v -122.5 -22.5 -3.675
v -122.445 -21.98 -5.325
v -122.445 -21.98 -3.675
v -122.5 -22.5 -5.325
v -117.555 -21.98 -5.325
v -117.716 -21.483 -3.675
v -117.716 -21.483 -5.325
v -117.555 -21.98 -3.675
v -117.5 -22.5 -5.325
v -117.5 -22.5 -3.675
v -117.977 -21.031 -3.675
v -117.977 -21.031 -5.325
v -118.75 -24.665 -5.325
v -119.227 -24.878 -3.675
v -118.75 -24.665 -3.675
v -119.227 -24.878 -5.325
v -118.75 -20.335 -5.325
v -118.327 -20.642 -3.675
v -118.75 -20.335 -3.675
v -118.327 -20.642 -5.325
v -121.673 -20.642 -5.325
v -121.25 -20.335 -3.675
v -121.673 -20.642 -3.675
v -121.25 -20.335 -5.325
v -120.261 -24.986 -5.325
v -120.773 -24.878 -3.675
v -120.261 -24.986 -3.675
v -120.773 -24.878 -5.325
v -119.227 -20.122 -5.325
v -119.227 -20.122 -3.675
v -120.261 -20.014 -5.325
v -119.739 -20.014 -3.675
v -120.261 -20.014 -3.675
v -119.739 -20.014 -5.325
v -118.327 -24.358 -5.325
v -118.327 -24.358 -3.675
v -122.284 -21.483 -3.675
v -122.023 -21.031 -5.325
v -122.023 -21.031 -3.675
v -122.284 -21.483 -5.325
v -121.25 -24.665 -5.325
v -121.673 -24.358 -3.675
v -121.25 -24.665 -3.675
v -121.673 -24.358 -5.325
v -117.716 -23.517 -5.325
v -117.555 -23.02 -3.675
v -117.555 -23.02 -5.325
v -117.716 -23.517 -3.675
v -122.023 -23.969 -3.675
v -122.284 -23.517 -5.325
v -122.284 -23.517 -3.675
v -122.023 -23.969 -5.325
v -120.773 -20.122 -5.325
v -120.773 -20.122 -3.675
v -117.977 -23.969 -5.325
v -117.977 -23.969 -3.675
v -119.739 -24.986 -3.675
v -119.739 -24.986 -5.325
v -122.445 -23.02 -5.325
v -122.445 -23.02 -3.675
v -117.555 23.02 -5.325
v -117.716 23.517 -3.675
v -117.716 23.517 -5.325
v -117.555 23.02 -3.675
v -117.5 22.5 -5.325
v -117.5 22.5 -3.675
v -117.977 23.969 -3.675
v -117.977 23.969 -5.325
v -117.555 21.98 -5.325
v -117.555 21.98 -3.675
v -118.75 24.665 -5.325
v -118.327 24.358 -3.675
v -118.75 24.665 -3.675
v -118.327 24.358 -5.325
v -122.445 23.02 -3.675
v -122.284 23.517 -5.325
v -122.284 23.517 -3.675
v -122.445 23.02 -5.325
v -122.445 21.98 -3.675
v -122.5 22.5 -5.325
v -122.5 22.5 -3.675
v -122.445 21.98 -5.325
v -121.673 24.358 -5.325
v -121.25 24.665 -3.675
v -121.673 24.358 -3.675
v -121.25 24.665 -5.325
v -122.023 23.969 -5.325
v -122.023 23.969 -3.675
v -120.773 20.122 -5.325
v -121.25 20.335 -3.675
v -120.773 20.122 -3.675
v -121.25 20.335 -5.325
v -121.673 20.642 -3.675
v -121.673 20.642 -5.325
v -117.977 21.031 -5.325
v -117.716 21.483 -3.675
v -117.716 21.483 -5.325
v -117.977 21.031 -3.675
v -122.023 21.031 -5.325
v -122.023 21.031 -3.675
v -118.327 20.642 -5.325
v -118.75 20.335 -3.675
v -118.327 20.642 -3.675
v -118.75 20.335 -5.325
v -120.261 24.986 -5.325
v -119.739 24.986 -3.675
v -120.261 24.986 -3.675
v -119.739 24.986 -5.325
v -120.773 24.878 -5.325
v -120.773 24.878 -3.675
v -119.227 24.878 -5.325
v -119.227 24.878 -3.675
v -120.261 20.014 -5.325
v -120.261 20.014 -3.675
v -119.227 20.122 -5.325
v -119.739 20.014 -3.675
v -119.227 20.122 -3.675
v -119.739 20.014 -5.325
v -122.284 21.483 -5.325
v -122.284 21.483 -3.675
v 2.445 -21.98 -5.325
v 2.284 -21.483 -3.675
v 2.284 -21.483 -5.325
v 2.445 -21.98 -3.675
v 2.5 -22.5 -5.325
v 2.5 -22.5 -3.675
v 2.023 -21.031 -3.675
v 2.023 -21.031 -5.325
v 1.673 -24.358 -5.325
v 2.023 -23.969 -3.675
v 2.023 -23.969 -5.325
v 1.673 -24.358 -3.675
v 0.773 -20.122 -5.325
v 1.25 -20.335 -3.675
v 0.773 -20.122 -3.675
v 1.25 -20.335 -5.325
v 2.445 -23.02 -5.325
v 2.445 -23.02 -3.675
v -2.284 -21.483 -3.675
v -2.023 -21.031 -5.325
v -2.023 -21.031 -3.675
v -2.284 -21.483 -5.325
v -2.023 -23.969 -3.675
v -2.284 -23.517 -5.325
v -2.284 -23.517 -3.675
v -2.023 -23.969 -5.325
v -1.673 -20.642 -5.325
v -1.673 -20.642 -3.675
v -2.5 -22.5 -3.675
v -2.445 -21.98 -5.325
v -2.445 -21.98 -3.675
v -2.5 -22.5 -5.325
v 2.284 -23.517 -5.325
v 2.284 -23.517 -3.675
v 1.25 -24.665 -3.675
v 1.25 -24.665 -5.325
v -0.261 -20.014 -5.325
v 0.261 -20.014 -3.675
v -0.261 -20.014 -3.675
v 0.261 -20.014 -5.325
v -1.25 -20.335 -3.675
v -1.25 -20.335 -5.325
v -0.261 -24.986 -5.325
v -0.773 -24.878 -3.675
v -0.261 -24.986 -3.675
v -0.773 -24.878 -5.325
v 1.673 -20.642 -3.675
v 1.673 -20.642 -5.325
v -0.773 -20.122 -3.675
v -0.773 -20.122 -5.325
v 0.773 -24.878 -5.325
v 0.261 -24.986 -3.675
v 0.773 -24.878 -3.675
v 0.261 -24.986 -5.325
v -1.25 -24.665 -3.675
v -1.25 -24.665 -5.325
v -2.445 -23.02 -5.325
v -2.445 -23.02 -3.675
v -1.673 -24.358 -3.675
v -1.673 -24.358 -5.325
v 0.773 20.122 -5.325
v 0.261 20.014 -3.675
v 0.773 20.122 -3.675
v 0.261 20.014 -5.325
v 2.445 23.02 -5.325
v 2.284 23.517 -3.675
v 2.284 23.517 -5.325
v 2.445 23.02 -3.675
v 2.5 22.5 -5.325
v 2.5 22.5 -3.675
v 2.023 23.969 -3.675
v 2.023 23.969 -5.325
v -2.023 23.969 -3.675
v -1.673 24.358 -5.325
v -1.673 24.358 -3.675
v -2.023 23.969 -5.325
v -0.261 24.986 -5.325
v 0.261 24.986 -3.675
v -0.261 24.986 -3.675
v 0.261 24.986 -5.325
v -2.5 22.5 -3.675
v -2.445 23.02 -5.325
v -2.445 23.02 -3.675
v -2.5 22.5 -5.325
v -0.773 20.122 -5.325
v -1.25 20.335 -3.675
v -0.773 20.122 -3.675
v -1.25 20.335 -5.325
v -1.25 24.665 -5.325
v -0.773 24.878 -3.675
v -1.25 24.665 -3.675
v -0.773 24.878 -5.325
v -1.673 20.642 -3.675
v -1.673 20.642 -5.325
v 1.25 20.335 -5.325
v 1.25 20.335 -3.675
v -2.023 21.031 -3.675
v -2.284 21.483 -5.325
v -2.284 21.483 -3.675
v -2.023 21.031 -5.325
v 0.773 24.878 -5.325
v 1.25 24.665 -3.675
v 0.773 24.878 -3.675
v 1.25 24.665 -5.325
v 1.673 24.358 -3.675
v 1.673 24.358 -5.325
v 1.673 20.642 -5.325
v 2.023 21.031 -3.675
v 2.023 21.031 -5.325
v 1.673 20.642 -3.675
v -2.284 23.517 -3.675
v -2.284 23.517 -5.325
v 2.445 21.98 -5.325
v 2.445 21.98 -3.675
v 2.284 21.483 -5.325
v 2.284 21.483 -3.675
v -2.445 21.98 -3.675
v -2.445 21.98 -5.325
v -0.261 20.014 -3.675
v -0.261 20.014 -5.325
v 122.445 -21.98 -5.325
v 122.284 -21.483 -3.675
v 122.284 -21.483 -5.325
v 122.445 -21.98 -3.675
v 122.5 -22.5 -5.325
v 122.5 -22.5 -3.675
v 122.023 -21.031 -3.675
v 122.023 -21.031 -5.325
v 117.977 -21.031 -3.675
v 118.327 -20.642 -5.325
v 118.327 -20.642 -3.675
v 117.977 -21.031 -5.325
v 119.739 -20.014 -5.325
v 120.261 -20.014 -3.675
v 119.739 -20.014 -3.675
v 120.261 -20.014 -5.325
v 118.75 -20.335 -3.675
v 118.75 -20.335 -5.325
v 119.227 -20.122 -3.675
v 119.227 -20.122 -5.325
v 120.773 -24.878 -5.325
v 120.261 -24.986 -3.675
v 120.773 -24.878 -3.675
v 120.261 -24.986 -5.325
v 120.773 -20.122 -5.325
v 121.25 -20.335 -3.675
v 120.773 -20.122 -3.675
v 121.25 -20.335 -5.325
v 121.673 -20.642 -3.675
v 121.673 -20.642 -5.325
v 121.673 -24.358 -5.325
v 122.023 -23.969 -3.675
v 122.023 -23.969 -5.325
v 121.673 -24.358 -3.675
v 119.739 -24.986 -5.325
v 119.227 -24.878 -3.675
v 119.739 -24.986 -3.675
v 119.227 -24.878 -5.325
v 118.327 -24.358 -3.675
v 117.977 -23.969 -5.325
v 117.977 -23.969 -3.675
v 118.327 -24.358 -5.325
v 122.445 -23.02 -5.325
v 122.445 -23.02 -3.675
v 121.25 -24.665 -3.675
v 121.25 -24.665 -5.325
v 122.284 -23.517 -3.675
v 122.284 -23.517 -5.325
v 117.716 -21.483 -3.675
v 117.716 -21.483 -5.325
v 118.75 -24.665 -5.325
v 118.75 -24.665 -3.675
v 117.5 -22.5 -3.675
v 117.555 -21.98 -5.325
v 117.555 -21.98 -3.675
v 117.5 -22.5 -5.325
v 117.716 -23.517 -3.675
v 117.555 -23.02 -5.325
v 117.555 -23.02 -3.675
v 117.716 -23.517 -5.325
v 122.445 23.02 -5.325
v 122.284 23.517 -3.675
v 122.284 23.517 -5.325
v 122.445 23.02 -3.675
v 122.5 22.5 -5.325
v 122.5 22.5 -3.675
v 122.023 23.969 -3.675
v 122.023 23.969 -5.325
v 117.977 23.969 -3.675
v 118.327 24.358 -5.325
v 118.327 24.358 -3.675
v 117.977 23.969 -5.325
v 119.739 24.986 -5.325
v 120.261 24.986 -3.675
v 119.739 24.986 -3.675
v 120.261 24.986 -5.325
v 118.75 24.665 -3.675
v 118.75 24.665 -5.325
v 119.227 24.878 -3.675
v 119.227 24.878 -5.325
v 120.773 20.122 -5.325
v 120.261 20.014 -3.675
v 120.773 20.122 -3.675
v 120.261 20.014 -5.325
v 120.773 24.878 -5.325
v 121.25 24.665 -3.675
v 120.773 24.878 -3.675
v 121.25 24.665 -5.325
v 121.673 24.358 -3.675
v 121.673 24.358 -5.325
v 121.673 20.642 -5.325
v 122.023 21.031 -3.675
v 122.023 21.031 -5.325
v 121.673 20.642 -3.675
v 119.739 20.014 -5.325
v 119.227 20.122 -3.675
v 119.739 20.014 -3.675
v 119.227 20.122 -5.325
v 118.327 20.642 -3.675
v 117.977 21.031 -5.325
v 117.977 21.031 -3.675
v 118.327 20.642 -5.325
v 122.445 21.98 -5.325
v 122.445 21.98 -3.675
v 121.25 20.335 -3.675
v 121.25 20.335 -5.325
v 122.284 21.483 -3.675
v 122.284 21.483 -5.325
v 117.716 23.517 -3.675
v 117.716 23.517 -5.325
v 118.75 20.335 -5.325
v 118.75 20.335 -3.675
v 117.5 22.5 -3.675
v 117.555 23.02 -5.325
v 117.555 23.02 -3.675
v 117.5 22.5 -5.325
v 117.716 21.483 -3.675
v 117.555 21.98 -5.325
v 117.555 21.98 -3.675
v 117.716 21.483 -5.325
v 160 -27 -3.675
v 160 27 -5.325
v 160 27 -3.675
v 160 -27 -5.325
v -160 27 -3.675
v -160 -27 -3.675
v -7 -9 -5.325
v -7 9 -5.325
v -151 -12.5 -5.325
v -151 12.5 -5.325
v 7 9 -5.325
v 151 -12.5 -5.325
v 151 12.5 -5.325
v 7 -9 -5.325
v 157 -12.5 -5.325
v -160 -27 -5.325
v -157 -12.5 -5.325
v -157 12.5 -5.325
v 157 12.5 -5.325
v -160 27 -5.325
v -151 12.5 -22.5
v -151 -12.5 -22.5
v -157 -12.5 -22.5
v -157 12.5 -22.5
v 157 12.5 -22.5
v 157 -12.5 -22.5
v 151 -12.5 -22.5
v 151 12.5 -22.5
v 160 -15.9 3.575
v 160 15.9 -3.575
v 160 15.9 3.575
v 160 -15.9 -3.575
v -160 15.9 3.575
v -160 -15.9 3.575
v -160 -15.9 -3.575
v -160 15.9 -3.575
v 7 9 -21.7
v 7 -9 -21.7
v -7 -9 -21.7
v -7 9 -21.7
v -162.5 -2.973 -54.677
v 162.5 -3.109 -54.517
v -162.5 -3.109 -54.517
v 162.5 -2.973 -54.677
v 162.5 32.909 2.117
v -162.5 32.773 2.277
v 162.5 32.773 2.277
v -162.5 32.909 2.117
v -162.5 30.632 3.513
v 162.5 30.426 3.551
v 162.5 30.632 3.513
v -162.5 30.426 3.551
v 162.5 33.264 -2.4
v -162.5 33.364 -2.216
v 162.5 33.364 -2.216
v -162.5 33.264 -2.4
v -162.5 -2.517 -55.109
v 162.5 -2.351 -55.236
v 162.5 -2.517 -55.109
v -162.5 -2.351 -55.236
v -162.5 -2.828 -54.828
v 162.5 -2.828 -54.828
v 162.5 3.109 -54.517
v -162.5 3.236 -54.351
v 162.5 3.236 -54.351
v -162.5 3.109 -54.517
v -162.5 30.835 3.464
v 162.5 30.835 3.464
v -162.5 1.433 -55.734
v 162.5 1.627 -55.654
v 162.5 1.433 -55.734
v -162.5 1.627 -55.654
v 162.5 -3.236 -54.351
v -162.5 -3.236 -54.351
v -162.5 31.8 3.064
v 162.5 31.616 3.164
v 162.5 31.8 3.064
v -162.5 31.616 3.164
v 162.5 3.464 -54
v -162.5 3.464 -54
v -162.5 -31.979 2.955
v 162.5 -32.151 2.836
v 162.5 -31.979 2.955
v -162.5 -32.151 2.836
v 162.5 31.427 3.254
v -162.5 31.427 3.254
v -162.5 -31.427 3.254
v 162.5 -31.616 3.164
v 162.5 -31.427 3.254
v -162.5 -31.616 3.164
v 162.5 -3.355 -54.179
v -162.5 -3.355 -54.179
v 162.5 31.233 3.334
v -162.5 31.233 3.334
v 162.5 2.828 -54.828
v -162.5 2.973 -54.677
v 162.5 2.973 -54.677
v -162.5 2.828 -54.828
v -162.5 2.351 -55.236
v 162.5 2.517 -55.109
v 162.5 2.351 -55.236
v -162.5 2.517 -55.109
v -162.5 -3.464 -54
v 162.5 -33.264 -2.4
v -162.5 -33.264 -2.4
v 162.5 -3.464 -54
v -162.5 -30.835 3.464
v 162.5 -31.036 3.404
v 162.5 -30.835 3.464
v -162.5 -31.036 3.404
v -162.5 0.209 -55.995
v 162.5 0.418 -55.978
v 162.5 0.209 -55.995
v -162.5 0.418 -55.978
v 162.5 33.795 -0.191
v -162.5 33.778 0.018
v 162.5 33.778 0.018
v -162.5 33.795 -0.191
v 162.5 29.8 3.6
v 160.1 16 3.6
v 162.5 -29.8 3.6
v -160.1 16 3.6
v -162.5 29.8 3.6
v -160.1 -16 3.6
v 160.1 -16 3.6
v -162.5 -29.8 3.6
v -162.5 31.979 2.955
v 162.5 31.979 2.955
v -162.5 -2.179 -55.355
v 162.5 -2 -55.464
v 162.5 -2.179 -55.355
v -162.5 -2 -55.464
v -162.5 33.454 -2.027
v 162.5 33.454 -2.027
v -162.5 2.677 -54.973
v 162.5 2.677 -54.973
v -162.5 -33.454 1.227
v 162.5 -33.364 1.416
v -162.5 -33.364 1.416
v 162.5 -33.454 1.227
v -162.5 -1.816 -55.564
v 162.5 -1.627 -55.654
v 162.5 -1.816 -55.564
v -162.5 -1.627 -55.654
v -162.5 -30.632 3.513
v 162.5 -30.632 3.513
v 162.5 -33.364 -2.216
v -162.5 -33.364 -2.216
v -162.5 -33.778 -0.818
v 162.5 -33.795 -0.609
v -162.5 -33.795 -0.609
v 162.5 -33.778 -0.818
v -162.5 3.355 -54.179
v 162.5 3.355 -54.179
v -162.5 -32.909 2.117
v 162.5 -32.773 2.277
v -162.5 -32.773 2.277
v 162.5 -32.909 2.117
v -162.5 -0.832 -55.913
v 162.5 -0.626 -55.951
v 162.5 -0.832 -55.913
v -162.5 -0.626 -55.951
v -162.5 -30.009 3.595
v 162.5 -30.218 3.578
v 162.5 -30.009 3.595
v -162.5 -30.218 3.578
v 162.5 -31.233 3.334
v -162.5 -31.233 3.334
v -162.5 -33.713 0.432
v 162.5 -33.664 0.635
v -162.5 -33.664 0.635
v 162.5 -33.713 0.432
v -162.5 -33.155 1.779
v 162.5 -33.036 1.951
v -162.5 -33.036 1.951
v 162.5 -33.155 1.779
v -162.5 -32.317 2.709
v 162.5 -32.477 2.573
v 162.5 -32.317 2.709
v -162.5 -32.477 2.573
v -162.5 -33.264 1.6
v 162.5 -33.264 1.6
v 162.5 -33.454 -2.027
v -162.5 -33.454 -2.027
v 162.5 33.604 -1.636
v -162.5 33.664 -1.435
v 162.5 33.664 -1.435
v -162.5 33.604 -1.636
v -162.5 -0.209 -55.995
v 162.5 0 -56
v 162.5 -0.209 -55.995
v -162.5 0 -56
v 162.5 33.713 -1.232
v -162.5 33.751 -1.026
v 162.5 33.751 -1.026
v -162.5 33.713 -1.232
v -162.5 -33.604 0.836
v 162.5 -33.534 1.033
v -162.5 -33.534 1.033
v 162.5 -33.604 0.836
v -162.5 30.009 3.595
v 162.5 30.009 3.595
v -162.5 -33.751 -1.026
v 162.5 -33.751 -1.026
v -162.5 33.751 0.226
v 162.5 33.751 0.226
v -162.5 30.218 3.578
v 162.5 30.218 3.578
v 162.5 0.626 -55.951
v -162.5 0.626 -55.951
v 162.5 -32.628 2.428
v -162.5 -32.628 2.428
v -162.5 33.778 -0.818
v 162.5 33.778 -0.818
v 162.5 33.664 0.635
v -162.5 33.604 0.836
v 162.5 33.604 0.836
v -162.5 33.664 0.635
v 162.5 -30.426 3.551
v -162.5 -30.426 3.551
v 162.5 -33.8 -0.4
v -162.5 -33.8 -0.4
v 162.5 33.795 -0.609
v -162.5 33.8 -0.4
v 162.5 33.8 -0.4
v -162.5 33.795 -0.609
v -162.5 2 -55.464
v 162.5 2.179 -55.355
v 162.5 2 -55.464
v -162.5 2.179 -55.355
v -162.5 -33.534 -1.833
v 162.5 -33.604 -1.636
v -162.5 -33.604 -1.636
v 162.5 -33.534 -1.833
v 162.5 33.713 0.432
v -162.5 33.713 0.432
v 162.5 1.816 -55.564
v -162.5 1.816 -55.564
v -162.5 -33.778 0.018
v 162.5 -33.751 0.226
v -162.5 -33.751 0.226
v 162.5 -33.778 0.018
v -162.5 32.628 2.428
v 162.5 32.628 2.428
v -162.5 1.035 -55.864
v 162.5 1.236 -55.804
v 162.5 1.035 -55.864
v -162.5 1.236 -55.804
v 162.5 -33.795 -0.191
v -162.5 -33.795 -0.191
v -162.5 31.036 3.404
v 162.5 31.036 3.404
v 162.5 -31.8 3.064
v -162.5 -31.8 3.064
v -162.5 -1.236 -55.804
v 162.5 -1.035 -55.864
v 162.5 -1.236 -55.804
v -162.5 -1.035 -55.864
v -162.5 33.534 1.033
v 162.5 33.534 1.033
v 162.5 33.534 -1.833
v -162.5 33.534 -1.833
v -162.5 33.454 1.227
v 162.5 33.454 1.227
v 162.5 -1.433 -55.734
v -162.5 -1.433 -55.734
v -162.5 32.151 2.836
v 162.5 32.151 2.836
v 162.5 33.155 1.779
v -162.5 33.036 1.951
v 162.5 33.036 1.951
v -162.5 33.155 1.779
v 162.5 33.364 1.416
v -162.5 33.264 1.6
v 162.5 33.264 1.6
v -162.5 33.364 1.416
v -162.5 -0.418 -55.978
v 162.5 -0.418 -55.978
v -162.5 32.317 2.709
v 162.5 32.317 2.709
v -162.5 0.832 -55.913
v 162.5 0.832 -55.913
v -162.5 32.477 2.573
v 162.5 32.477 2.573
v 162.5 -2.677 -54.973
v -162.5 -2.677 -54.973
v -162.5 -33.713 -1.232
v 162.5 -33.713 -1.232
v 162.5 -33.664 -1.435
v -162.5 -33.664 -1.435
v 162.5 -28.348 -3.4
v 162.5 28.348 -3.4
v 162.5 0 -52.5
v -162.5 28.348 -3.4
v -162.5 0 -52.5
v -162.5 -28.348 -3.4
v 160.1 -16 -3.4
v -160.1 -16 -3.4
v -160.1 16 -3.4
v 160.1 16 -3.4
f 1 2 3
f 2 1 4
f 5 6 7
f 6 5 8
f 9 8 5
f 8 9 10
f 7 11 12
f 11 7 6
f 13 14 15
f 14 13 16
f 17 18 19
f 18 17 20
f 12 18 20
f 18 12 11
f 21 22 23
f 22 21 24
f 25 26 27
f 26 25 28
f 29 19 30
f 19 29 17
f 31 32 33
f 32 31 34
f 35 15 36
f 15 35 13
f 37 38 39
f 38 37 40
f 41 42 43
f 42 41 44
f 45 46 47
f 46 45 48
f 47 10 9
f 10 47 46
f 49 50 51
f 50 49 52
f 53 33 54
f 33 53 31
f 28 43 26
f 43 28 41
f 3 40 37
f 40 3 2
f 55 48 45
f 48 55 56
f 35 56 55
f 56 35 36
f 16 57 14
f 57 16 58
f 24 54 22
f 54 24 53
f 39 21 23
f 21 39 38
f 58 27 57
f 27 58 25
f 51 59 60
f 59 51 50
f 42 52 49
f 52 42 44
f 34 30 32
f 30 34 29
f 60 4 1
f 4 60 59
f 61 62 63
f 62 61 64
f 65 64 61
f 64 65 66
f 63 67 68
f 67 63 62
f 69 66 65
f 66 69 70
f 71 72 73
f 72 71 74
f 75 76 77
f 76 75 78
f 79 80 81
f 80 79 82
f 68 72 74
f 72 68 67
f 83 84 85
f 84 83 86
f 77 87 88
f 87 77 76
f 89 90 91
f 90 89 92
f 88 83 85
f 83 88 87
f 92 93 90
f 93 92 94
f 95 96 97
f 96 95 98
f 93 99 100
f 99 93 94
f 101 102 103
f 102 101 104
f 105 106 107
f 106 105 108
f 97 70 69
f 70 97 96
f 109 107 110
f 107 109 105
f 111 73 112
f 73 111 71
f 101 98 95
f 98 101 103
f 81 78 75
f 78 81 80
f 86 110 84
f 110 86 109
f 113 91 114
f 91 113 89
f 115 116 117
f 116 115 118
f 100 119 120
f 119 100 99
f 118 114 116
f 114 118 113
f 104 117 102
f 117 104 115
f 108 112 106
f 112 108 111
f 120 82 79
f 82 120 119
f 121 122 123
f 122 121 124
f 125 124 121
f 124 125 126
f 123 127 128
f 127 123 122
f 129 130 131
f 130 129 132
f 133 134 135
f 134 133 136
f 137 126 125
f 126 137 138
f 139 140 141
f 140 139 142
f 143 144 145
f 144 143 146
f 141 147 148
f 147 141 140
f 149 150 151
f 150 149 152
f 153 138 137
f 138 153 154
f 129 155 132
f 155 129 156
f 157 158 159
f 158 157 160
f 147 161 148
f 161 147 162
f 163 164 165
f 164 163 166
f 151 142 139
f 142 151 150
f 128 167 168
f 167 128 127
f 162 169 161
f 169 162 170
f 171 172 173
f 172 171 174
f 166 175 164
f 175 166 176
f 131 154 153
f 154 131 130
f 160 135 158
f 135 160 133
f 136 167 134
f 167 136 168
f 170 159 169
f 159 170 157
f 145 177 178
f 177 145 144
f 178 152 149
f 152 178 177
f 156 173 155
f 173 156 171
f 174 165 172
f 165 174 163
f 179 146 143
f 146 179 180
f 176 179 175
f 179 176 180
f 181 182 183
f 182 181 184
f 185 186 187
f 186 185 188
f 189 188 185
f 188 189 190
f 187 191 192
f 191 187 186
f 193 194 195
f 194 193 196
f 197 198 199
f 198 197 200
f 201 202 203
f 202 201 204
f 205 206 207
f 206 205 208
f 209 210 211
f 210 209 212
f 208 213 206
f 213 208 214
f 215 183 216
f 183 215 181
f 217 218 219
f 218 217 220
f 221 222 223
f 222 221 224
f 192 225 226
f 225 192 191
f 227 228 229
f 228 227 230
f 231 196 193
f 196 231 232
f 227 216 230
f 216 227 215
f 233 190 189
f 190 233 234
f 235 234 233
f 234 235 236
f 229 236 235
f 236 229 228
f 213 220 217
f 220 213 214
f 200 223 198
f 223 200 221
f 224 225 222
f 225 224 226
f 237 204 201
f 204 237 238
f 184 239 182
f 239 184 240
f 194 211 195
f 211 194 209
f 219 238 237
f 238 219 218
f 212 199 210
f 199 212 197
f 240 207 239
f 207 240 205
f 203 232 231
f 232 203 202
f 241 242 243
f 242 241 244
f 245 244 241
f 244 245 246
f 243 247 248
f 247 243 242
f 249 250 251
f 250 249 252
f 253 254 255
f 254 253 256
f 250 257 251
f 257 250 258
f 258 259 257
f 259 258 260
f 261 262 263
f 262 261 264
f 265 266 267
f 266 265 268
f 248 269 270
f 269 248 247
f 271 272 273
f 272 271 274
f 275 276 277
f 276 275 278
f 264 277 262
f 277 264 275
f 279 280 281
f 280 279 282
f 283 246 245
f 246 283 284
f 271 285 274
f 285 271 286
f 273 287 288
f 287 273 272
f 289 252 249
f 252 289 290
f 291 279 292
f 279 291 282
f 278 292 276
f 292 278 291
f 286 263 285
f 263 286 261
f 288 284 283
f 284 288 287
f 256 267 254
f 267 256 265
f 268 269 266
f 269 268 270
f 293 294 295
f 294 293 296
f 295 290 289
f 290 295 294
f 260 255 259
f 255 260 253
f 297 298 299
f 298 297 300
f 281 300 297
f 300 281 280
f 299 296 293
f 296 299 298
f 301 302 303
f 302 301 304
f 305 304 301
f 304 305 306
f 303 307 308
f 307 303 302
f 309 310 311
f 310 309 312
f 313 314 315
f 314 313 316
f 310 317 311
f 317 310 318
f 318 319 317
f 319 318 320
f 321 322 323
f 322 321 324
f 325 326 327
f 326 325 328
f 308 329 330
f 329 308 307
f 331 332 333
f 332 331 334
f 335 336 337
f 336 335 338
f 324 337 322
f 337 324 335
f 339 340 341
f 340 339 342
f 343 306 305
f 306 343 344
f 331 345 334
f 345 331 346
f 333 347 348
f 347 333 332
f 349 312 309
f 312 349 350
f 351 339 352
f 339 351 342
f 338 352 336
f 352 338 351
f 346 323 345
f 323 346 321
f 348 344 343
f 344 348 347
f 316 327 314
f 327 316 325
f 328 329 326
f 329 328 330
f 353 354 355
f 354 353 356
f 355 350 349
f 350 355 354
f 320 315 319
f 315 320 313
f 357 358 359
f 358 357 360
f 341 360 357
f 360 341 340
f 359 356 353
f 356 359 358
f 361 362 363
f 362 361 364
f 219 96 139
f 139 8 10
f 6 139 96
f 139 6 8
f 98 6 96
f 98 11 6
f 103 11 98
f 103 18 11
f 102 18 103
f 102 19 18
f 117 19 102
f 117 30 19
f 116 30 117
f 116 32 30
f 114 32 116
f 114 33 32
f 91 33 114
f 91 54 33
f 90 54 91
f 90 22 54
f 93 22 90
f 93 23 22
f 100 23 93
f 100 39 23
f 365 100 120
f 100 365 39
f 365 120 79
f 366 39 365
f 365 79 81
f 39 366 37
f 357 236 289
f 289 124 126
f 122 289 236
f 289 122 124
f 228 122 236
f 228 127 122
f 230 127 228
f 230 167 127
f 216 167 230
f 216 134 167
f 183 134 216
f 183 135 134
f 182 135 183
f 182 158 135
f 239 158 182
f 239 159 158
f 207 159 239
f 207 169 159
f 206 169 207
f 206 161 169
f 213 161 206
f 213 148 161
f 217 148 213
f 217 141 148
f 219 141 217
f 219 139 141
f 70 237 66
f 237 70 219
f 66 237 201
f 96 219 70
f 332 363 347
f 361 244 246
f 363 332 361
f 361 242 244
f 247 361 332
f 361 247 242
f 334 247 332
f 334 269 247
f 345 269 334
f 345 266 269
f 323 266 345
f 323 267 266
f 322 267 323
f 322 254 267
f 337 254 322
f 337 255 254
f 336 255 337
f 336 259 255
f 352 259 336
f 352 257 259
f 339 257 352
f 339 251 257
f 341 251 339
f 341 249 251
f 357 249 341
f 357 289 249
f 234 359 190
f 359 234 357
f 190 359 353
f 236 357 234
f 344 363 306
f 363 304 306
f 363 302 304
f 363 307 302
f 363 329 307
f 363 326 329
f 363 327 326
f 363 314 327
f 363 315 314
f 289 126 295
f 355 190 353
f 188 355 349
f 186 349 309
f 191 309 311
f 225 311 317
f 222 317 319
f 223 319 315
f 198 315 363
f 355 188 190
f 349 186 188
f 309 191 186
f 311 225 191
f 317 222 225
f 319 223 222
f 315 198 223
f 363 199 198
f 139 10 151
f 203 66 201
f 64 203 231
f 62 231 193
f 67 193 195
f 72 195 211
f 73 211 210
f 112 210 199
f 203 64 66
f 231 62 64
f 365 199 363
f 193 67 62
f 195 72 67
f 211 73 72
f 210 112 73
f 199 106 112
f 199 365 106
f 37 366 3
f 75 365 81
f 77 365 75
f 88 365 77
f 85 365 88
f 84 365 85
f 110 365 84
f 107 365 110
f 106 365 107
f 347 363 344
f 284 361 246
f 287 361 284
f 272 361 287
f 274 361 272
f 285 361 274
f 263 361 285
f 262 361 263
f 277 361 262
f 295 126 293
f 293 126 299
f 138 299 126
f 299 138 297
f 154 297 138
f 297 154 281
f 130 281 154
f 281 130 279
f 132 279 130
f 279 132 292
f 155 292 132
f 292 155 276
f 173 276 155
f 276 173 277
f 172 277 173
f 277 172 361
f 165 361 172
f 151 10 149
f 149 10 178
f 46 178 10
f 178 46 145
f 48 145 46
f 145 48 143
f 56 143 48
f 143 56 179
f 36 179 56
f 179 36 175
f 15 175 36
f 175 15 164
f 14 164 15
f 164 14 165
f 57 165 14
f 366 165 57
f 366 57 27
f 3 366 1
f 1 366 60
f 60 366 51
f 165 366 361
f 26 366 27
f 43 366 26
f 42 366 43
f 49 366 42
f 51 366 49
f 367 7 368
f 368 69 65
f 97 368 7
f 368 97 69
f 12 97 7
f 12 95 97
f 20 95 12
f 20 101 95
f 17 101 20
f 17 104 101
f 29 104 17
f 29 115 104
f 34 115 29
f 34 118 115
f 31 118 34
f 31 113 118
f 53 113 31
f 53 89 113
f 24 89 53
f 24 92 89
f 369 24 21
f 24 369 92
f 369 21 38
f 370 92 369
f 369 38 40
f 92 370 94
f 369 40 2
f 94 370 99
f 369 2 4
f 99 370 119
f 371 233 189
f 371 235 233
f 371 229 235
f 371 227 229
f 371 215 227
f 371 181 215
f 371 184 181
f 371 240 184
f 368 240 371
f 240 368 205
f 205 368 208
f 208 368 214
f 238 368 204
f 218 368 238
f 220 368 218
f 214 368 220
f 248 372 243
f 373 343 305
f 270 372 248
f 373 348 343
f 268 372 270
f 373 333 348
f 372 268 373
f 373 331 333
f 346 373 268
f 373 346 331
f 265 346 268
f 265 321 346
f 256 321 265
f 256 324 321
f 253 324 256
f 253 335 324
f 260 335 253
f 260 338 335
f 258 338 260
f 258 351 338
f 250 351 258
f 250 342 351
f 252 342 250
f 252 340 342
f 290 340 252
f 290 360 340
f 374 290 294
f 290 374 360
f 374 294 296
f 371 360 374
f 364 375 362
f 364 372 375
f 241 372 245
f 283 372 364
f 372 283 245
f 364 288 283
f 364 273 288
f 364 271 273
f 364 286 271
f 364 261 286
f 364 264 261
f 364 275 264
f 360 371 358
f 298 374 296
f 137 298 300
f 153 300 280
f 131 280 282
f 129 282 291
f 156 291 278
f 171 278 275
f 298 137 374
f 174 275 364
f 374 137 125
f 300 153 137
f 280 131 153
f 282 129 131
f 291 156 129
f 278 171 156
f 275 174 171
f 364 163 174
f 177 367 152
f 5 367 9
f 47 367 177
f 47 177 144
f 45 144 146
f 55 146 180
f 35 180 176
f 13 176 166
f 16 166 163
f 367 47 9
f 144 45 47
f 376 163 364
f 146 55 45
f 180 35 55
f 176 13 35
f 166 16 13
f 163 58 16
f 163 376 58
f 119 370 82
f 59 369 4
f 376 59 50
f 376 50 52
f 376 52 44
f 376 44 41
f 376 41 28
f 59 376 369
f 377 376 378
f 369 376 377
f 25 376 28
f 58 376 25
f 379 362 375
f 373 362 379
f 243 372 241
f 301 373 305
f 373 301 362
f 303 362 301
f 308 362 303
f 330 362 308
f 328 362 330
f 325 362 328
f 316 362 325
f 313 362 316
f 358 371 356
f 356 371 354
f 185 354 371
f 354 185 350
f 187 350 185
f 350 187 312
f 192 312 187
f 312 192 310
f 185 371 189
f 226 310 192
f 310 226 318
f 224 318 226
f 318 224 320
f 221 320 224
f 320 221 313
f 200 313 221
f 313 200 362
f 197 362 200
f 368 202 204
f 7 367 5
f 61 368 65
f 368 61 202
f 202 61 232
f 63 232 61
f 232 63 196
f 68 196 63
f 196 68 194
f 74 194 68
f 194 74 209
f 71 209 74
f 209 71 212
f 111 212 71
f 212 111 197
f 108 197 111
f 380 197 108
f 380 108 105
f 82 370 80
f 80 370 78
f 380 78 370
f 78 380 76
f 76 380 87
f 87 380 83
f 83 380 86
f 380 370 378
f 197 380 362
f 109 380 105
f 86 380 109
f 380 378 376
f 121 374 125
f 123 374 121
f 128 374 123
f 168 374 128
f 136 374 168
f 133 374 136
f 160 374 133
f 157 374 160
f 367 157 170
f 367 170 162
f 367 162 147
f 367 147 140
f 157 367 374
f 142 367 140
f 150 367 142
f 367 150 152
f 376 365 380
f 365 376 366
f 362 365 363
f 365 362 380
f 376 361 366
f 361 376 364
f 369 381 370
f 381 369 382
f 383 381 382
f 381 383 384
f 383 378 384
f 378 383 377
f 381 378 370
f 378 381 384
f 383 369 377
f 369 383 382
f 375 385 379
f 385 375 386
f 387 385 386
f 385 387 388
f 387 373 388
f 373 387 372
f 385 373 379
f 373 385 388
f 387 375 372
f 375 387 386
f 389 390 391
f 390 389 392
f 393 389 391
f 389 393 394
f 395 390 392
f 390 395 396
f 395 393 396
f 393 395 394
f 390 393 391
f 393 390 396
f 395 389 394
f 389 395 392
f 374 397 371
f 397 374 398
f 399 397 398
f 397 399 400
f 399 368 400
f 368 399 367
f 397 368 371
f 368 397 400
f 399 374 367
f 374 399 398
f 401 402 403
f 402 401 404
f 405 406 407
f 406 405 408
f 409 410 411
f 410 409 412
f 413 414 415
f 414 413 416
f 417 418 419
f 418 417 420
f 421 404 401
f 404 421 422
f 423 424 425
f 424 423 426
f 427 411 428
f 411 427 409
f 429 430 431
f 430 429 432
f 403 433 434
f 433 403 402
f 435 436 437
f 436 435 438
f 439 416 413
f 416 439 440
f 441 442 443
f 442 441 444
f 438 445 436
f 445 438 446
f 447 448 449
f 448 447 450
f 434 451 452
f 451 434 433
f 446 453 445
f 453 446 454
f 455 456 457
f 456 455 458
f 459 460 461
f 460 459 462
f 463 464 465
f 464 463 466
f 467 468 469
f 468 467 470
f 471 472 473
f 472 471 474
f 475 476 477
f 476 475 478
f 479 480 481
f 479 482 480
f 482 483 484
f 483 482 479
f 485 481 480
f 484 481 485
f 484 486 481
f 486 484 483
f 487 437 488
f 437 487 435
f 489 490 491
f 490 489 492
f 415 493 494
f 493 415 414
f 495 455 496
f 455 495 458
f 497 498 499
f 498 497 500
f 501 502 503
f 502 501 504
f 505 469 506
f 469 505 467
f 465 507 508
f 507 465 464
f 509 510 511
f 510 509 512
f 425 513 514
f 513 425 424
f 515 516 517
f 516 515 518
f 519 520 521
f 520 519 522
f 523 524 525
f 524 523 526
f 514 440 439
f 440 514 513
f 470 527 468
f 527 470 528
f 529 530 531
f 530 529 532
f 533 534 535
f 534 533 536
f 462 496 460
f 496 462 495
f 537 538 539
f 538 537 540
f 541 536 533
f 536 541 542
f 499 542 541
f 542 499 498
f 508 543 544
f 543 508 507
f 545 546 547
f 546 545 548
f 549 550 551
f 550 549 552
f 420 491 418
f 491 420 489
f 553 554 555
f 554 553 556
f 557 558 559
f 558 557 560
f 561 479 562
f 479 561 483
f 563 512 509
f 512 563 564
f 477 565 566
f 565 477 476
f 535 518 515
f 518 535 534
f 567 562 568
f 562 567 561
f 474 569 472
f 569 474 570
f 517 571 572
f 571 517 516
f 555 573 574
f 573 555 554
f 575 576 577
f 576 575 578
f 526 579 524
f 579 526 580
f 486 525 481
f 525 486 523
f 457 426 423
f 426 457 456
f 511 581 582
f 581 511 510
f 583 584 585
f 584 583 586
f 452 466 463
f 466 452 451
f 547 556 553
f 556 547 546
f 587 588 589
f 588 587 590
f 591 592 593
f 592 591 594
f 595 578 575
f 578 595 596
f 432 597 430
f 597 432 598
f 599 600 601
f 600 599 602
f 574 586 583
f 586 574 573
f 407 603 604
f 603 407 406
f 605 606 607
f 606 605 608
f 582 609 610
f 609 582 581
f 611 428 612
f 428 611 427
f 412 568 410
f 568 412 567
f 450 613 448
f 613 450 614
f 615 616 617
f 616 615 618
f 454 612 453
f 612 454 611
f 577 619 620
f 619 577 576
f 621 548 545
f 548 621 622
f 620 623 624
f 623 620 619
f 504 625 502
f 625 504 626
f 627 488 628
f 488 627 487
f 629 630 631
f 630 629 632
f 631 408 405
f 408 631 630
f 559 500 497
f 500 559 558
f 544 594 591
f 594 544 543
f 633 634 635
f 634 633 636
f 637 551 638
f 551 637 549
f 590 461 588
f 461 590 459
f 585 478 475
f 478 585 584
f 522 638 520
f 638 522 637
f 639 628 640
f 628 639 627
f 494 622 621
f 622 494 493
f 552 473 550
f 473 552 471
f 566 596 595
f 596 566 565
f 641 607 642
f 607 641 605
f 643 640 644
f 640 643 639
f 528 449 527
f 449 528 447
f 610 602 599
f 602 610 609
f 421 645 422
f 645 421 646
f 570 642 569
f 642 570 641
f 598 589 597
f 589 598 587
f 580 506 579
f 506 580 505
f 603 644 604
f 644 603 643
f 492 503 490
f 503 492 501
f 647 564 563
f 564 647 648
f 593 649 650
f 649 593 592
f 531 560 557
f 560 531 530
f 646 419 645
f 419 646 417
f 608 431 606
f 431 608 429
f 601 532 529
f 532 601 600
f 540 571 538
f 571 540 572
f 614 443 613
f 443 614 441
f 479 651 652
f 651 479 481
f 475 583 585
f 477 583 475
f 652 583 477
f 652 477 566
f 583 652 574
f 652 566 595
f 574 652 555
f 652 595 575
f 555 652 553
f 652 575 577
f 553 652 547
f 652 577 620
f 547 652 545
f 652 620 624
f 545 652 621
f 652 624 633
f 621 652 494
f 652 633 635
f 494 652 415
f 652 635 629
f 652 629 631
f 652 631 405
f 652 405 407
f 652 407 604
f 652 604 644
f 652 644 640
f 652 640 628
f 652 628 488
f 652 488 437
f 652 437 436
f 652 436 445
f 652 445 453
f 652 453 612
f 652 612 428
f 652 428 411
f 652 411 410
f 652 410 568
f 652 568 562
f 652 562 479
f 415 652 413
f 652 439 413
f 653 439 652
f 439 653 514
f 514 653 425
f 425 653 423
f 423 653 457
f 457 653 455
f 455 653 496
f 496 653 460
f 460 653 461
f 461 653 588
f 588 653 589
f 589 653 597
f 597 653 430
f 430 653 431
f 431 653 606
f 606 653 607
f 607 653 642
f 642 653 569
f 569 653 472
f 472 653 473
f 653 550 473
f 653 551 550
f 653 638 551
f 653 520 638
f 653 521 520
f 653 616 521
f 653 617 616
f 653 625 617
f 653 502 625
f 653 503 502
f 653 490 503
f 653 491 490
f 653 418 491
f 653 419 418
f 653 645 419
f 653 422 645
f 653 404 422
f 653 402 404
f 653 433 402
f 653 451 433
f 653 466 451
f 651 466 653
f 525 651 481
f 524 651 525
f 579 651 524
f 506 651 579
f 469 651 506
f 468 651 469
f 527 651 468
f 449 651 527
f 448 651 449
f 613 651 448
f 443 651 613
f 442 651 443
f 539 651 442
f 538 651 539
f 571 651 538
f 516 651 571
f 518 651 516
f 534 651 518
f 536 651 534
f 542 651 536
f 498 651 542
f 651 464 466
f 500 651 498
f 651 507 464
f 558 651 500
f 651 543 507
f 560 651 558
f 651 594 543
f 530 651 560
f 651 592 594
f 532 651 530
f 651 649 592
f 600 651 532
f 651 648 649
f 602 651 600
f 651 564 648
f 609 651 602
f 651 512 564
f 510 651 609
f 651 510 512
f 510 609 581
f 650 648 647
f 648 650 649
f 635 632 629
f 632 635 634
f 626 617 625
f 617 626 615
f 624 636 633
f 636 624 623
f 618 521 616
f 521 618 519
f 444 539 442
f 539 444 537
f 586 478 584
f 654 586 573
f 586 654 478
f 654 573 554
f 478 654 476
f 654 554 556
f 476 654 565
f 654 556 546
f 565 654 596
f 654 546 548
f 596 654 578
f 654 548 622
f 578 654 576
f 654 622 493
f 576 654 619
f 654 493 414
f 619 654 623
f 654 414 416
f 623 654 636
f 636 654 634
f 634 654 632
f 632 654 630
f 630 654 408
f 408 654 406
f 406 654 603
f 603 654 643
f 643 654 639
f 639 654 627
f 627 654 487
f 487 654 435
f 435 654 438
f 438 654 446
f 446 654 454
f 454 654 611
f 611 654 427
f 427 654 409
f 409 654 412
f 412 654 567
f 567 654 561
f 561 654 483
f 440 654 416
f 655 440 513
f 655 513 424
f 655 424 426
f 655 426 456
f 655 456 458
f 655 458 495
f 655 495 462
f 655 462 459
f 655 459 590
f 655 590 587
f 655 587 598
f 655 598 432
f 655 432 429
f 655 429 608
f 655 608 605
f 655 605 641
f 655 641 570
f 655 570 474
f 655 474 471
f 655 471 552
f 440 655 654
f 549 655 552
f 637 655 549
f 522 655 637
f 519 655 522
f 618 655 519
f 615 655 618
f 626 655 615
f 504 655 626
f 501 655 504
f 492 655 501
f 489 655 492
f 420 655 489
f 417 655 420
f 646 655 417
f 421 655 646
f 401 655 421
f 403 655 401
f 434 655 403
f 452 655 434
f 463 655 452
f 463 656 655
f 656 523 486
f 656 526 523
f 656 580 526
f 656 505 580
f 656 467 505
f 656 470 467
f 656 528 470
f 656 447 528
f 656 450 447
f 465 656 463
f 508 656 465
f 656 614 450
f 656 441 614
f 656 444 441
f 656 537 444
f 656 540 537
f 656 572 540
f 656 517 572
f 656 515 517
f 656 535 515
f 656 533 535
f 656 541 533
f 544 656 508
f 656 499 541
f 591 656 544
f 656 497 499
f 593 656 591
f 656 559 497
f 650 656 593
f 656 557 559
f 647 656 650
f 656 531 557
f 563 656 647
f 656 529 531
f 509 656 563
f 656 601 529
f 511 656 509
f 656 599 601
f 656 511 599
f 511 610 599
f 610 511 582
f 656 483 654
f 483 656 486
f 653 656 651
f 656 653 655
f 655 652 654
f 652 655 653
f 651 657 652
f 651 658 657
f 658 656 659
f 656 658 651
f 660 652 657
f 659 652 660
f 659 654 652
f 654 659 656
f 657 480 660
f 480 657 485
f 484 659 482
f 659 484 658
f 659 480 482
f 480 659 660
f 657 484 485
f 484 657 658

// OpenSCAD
module ldp8008(){
    color("white") cube([320, 31.8, 7.15], center=true);
    difference(){
        translate([0,0,-4.5]) color("black") cube([320, 54, 1.65], center=true);
        for(X=[-120, 0, 120], Y=[-22.5,22.5]) translate([X, Y, -5]) cylinder(d=5, h=3, center=true, $fn=30);
    }
    translate([0, 0, -13.5]) color("black") cube([14, 18, 16.4], center=true);
    for(X=[-154,154]) translate([X, 0, -13.5]) color("grey") cube([6, 25, 18], center=true);
}






ldp8008();


length=325;
fudge=0.2;
//translate([0,0,-17.5]) rotate([0, 90, 0]) rotate([0, 0, 120]) cylinder(d=85, h=3, center=true, $fn=3);
difference(){
    union(){
    hull(){
        for(Y=[-29.8, 29.8]) translate([0, Y, -0.4]) rotate([0, 90, 0])  cylinder(d=6, h=length, center=true, $fn=120);
    }
    difference(){
        hull(){
            for(Y=[-29.8, 29.8]) translate([0, Y, -0.4]) rotate([0, 90, 0])  cylinder(d=8, h=length, center=true, $fn=120);
            translate([0, 0, -52]) rotate([0, 90, 0])  cylinder(d=8, h=length, center=true, $fn=120);
        }
        translate([0,0,-17.5]) rotate([0, 90, 0]) rotate([0, 0, 120]) cylinder(d=70, h=322+5, center=true, $fn=3);
        
    }
    }
    translate([0,0,2]) cube([320+fudge, 31.8+fudge, 15], center=true);
}
